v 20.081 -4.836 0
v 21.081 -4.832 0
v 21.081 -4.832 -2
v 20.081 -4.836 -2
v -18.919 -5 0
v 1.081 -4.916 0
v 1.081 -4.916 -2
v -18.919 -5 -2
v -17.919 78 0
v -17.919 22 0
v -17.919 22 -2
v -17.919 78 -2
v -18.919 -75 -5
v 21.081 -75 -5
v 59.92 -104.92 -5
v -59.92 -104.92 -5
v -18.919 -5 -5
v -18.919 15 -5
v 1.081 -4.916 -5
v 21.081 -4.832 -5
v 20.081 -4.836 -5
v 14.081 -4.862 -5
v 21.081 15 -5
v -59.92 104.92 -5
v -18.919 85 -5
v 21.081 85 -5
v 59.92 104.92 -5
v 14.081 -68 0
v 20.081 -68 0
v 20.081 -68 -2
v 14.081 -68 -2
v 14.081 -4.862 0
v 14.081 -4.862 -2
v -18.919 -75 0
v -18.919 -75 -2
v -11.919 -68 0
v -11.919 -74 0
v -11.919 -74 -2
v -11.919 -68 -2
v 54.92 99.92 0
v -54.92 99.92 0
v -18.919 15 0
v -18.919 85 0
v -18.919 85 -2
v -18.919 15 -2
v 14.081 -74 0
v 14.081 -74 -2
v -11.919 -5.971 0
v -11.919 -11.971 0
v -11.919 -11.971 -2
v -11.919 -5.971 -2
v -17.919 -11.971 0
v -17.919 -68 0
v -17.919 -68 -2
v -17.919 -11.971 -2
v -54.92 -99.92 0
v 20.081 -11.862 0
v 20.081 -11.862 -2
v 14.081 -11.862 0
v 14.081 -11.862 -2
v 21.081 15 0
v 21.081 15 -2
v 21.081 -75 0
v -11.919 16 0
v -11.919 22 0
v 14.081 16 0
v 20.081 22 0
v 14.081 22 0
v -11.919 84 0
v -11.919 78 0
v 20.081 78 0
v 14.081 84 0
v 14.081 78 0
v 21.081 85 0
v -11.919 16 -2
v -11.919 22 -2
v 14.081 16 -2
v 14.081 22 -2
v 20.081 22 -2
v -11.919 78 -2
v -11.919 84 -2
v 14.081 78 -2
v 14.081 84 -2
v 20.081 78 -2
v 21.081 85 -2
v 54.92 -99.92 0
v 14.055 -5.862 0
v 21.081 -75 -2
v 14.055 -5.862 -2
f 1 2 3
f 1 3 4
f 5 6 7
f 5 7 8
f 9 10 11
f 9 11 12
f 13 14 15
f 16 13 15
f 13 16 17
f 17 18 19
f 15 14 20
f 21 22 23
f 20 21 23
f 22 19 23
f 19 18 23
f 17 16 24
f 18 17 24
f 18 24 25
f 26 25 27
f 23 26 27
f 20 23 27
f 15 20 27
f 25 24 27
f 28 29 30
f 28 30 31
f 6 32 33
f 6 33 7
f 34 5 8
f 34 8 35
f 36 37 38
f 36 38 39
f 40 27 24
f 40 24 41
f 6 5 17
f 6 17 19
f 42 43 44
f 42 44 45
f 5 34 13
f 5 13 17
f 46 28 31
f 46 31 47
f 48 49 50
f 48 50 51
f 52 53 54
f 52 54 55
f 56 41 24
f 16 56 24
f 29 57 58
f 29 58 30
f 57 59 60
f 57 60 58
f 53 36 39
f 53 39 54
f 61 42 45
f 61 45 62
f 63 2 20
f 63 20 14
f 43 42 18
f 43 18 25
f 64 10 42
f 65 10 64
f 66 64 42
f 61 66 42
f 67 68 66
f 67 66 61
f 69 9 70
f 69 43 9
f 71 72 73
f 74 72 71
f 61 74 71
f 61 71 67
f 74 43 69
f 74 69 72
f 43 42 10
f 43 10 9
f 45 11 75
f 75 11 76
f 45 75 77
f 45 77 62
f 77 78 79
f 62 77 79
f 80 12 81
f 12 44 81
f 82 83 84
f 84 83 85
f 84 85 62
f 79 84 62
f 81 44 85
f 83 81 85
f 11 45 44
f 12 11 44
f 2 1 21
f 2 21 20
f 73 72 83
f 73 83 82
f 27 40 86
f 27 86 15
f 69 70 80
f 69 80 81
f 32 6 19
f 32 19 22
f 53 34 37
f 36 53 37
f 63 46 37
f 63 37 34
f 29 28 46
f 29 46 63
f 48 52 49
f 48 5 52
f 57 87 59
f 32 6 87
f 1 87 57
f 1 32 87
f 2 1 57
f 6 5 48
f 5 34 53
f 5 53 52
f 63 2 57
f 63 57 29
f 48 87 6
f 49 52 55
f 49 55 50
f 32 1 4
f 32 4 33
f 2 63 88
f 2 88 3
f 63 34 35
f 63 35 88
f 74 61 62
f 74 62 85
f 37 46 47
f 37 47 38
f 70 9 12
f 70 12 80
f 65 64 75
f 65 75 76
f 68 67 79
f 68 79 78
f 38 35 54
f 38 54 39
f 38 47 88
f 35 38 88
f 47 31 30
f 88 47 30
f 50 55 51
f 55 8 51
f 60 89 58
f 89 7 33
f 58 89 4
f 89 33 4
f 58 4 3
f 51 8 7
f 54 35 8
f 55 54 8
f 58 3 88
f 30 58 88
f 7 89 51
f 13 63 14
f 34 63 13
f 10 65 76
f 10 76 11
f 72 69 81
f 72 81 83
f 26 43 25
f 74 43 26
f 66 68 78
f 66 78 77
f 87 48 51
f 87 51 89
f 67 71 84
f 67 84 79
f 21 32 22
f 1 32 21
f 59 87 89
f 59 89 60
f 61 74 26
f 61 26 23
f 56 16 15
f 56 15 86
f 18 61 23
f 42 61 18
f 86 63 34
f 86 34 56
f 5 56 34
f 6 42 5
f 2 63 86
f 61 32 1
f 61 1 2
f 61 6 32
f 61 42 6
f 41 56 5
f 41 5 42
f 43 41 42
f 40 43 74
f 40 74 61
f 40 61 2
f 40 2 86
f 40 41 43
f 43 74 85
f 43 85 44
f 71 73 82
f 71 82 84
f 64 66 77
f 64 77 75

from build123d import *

# Parameters (mm, degrees)
F0_W        = 120
F0_H        = 210
F1_DEPTH    = 5
F2_DEPTH    = 2
F3_T1_DEPTH = 236.1282991577
F3_T3_DEPTH = 146.1282991577


# Not quite as in the source:
# - a fillet or chamfer that OpenCascade refuses, or shapes differently, is made with other operations: its cross-section is extruded or revolved along the edge and cut away or added


with BuildPart() as f1:
    # F0 (on Top) → F1 (new body)
    with BuildSketch(Plane.XY):
        Rectangle(F0_W, F0_H)
        Polygon((20.0805937573, -4.8363452922), (21.0805937573, -4.8321490176), (21.0805937573, -5.8321578219), (21.0805937573, -75), (-18.9194062427, -75), (-18.9194062427, -5), (1.0805937573, -4.9160745088), (14.0805937573, -4.8615229395), align=None, mode=Mode.SUBTRACT)
        Polygon((-18.9194062427, 22), (-18.9194062427, 52.2003881633), (-18.9194062427, 78), (-18.9194062427, 85), (-11.9194062427, 85), (14.0805937573, 85), (21.0805937573, 85), (21.0805937573, 78), (21.0805937573, 50.9695373476), (21.0805937573, 15), (14.0805937573, 15), (-11.9194062427, 15), (-18.9194062427, 15), align=None, mode=Mode.SUBTRACT)
    extrude(amount=-F1_DEPTH)

    # F3: chamfer of 5.08 on 4 edges, made by hand

    # F3_s2 → F3_t1 (cut)
    with BuildSketch(Plane.XZ.offset(-118.0641495789)):
        Polygon((-54.92, 0), (-60, -5.08), (-60, 0), align=None)
        Polygon((54.92, 0), (60, -5.08), (60, 0), align=None)
    extrude(amount=F3_T1_DEPTH, mode=Mode.SUBTRACT)

    # F3_s4 → F3_t3 (cut)
    with BuildSketch(Plane.YZ.offset(-73.0641495789)):
        Polygon((105, -5.08), (99.92, 0), (105, 0), align=None)
        Polygon((-105, -5.08), (-99.92, 0), (-105, 0), align=None)
    extrude(amount=F3_T3_DEPTH, mode=Mode.SUBTRACT)


with BuildPart() as f2:
    # F0 (on Top) → F2 (new body)
    with BuildSketch(Plane.XY):
        Polygon((21.0805937573, -5.8321578219), (21.0805937573, -4.8321490176), (20.0805937573, -4.8363452922), (14.0805937573, -4.8615229395), (1.0805937573, -4.9160745088), (-18.9194062427, -5), (-18.9194062427, -75), (21.0805937573, -75), align=None)
        Polygon((14.0554163316, -5.8616373952), (14.0805937573, -11.8615845698), (20.0805937573, -11.8615845698), (20.0805937573, -68), (14.0805937573, -68), (14.0805937573, -74), (-11.9194062427, -74), (-11.9194062427, -68), (-17.9194062427, -68), (-17.9194062427, -11.9706877083), (-11.9194062427, -11.9706877083), (-11.9194062427, -5.9706348824), align=None, mode=Mode.SUBTRACT)
    extrude(amount=-F2_DEPTH)


with BuildPart() as f2b:
    # F0 (on Top) → F2, piece 2 (new body)
    with BuildSketch(Plane.XY):
        Polygon((-18.9194062427, 78), (-18.9194062427, 52.2003881633), (-18.9194062427, 22), (-18.9194062427, 15), (-11.9194062427, 15), (14.0805937573, 15), (21.0805937573, 15), (21.0805937573, 50.9695373476), (21.0805937573, 78), (21.0805937573, 85), (14.0805937573, 85), (-11.9194062427, 85), (-18.9194062427, 85), align=None)
        Polygon((-17.9194062427, 22), (-17.9194062427, 78), (-11.9194062427, 78), (-11.9194062427, 84), (14.0805937573, 84), (14.0805937573, 78), (20.0805937573, 78), (20.0805937573, 22), (14.0805937573, 22), (14.0805937573, 16), (-11.9194062427, 16), (-11.9194062427, 22), align=None, mode=Mode.SUBTRACT)
    extrude(amount=-F2_DEPTH)


solid = Compound([f1.part, f2.part, f2b.part])
